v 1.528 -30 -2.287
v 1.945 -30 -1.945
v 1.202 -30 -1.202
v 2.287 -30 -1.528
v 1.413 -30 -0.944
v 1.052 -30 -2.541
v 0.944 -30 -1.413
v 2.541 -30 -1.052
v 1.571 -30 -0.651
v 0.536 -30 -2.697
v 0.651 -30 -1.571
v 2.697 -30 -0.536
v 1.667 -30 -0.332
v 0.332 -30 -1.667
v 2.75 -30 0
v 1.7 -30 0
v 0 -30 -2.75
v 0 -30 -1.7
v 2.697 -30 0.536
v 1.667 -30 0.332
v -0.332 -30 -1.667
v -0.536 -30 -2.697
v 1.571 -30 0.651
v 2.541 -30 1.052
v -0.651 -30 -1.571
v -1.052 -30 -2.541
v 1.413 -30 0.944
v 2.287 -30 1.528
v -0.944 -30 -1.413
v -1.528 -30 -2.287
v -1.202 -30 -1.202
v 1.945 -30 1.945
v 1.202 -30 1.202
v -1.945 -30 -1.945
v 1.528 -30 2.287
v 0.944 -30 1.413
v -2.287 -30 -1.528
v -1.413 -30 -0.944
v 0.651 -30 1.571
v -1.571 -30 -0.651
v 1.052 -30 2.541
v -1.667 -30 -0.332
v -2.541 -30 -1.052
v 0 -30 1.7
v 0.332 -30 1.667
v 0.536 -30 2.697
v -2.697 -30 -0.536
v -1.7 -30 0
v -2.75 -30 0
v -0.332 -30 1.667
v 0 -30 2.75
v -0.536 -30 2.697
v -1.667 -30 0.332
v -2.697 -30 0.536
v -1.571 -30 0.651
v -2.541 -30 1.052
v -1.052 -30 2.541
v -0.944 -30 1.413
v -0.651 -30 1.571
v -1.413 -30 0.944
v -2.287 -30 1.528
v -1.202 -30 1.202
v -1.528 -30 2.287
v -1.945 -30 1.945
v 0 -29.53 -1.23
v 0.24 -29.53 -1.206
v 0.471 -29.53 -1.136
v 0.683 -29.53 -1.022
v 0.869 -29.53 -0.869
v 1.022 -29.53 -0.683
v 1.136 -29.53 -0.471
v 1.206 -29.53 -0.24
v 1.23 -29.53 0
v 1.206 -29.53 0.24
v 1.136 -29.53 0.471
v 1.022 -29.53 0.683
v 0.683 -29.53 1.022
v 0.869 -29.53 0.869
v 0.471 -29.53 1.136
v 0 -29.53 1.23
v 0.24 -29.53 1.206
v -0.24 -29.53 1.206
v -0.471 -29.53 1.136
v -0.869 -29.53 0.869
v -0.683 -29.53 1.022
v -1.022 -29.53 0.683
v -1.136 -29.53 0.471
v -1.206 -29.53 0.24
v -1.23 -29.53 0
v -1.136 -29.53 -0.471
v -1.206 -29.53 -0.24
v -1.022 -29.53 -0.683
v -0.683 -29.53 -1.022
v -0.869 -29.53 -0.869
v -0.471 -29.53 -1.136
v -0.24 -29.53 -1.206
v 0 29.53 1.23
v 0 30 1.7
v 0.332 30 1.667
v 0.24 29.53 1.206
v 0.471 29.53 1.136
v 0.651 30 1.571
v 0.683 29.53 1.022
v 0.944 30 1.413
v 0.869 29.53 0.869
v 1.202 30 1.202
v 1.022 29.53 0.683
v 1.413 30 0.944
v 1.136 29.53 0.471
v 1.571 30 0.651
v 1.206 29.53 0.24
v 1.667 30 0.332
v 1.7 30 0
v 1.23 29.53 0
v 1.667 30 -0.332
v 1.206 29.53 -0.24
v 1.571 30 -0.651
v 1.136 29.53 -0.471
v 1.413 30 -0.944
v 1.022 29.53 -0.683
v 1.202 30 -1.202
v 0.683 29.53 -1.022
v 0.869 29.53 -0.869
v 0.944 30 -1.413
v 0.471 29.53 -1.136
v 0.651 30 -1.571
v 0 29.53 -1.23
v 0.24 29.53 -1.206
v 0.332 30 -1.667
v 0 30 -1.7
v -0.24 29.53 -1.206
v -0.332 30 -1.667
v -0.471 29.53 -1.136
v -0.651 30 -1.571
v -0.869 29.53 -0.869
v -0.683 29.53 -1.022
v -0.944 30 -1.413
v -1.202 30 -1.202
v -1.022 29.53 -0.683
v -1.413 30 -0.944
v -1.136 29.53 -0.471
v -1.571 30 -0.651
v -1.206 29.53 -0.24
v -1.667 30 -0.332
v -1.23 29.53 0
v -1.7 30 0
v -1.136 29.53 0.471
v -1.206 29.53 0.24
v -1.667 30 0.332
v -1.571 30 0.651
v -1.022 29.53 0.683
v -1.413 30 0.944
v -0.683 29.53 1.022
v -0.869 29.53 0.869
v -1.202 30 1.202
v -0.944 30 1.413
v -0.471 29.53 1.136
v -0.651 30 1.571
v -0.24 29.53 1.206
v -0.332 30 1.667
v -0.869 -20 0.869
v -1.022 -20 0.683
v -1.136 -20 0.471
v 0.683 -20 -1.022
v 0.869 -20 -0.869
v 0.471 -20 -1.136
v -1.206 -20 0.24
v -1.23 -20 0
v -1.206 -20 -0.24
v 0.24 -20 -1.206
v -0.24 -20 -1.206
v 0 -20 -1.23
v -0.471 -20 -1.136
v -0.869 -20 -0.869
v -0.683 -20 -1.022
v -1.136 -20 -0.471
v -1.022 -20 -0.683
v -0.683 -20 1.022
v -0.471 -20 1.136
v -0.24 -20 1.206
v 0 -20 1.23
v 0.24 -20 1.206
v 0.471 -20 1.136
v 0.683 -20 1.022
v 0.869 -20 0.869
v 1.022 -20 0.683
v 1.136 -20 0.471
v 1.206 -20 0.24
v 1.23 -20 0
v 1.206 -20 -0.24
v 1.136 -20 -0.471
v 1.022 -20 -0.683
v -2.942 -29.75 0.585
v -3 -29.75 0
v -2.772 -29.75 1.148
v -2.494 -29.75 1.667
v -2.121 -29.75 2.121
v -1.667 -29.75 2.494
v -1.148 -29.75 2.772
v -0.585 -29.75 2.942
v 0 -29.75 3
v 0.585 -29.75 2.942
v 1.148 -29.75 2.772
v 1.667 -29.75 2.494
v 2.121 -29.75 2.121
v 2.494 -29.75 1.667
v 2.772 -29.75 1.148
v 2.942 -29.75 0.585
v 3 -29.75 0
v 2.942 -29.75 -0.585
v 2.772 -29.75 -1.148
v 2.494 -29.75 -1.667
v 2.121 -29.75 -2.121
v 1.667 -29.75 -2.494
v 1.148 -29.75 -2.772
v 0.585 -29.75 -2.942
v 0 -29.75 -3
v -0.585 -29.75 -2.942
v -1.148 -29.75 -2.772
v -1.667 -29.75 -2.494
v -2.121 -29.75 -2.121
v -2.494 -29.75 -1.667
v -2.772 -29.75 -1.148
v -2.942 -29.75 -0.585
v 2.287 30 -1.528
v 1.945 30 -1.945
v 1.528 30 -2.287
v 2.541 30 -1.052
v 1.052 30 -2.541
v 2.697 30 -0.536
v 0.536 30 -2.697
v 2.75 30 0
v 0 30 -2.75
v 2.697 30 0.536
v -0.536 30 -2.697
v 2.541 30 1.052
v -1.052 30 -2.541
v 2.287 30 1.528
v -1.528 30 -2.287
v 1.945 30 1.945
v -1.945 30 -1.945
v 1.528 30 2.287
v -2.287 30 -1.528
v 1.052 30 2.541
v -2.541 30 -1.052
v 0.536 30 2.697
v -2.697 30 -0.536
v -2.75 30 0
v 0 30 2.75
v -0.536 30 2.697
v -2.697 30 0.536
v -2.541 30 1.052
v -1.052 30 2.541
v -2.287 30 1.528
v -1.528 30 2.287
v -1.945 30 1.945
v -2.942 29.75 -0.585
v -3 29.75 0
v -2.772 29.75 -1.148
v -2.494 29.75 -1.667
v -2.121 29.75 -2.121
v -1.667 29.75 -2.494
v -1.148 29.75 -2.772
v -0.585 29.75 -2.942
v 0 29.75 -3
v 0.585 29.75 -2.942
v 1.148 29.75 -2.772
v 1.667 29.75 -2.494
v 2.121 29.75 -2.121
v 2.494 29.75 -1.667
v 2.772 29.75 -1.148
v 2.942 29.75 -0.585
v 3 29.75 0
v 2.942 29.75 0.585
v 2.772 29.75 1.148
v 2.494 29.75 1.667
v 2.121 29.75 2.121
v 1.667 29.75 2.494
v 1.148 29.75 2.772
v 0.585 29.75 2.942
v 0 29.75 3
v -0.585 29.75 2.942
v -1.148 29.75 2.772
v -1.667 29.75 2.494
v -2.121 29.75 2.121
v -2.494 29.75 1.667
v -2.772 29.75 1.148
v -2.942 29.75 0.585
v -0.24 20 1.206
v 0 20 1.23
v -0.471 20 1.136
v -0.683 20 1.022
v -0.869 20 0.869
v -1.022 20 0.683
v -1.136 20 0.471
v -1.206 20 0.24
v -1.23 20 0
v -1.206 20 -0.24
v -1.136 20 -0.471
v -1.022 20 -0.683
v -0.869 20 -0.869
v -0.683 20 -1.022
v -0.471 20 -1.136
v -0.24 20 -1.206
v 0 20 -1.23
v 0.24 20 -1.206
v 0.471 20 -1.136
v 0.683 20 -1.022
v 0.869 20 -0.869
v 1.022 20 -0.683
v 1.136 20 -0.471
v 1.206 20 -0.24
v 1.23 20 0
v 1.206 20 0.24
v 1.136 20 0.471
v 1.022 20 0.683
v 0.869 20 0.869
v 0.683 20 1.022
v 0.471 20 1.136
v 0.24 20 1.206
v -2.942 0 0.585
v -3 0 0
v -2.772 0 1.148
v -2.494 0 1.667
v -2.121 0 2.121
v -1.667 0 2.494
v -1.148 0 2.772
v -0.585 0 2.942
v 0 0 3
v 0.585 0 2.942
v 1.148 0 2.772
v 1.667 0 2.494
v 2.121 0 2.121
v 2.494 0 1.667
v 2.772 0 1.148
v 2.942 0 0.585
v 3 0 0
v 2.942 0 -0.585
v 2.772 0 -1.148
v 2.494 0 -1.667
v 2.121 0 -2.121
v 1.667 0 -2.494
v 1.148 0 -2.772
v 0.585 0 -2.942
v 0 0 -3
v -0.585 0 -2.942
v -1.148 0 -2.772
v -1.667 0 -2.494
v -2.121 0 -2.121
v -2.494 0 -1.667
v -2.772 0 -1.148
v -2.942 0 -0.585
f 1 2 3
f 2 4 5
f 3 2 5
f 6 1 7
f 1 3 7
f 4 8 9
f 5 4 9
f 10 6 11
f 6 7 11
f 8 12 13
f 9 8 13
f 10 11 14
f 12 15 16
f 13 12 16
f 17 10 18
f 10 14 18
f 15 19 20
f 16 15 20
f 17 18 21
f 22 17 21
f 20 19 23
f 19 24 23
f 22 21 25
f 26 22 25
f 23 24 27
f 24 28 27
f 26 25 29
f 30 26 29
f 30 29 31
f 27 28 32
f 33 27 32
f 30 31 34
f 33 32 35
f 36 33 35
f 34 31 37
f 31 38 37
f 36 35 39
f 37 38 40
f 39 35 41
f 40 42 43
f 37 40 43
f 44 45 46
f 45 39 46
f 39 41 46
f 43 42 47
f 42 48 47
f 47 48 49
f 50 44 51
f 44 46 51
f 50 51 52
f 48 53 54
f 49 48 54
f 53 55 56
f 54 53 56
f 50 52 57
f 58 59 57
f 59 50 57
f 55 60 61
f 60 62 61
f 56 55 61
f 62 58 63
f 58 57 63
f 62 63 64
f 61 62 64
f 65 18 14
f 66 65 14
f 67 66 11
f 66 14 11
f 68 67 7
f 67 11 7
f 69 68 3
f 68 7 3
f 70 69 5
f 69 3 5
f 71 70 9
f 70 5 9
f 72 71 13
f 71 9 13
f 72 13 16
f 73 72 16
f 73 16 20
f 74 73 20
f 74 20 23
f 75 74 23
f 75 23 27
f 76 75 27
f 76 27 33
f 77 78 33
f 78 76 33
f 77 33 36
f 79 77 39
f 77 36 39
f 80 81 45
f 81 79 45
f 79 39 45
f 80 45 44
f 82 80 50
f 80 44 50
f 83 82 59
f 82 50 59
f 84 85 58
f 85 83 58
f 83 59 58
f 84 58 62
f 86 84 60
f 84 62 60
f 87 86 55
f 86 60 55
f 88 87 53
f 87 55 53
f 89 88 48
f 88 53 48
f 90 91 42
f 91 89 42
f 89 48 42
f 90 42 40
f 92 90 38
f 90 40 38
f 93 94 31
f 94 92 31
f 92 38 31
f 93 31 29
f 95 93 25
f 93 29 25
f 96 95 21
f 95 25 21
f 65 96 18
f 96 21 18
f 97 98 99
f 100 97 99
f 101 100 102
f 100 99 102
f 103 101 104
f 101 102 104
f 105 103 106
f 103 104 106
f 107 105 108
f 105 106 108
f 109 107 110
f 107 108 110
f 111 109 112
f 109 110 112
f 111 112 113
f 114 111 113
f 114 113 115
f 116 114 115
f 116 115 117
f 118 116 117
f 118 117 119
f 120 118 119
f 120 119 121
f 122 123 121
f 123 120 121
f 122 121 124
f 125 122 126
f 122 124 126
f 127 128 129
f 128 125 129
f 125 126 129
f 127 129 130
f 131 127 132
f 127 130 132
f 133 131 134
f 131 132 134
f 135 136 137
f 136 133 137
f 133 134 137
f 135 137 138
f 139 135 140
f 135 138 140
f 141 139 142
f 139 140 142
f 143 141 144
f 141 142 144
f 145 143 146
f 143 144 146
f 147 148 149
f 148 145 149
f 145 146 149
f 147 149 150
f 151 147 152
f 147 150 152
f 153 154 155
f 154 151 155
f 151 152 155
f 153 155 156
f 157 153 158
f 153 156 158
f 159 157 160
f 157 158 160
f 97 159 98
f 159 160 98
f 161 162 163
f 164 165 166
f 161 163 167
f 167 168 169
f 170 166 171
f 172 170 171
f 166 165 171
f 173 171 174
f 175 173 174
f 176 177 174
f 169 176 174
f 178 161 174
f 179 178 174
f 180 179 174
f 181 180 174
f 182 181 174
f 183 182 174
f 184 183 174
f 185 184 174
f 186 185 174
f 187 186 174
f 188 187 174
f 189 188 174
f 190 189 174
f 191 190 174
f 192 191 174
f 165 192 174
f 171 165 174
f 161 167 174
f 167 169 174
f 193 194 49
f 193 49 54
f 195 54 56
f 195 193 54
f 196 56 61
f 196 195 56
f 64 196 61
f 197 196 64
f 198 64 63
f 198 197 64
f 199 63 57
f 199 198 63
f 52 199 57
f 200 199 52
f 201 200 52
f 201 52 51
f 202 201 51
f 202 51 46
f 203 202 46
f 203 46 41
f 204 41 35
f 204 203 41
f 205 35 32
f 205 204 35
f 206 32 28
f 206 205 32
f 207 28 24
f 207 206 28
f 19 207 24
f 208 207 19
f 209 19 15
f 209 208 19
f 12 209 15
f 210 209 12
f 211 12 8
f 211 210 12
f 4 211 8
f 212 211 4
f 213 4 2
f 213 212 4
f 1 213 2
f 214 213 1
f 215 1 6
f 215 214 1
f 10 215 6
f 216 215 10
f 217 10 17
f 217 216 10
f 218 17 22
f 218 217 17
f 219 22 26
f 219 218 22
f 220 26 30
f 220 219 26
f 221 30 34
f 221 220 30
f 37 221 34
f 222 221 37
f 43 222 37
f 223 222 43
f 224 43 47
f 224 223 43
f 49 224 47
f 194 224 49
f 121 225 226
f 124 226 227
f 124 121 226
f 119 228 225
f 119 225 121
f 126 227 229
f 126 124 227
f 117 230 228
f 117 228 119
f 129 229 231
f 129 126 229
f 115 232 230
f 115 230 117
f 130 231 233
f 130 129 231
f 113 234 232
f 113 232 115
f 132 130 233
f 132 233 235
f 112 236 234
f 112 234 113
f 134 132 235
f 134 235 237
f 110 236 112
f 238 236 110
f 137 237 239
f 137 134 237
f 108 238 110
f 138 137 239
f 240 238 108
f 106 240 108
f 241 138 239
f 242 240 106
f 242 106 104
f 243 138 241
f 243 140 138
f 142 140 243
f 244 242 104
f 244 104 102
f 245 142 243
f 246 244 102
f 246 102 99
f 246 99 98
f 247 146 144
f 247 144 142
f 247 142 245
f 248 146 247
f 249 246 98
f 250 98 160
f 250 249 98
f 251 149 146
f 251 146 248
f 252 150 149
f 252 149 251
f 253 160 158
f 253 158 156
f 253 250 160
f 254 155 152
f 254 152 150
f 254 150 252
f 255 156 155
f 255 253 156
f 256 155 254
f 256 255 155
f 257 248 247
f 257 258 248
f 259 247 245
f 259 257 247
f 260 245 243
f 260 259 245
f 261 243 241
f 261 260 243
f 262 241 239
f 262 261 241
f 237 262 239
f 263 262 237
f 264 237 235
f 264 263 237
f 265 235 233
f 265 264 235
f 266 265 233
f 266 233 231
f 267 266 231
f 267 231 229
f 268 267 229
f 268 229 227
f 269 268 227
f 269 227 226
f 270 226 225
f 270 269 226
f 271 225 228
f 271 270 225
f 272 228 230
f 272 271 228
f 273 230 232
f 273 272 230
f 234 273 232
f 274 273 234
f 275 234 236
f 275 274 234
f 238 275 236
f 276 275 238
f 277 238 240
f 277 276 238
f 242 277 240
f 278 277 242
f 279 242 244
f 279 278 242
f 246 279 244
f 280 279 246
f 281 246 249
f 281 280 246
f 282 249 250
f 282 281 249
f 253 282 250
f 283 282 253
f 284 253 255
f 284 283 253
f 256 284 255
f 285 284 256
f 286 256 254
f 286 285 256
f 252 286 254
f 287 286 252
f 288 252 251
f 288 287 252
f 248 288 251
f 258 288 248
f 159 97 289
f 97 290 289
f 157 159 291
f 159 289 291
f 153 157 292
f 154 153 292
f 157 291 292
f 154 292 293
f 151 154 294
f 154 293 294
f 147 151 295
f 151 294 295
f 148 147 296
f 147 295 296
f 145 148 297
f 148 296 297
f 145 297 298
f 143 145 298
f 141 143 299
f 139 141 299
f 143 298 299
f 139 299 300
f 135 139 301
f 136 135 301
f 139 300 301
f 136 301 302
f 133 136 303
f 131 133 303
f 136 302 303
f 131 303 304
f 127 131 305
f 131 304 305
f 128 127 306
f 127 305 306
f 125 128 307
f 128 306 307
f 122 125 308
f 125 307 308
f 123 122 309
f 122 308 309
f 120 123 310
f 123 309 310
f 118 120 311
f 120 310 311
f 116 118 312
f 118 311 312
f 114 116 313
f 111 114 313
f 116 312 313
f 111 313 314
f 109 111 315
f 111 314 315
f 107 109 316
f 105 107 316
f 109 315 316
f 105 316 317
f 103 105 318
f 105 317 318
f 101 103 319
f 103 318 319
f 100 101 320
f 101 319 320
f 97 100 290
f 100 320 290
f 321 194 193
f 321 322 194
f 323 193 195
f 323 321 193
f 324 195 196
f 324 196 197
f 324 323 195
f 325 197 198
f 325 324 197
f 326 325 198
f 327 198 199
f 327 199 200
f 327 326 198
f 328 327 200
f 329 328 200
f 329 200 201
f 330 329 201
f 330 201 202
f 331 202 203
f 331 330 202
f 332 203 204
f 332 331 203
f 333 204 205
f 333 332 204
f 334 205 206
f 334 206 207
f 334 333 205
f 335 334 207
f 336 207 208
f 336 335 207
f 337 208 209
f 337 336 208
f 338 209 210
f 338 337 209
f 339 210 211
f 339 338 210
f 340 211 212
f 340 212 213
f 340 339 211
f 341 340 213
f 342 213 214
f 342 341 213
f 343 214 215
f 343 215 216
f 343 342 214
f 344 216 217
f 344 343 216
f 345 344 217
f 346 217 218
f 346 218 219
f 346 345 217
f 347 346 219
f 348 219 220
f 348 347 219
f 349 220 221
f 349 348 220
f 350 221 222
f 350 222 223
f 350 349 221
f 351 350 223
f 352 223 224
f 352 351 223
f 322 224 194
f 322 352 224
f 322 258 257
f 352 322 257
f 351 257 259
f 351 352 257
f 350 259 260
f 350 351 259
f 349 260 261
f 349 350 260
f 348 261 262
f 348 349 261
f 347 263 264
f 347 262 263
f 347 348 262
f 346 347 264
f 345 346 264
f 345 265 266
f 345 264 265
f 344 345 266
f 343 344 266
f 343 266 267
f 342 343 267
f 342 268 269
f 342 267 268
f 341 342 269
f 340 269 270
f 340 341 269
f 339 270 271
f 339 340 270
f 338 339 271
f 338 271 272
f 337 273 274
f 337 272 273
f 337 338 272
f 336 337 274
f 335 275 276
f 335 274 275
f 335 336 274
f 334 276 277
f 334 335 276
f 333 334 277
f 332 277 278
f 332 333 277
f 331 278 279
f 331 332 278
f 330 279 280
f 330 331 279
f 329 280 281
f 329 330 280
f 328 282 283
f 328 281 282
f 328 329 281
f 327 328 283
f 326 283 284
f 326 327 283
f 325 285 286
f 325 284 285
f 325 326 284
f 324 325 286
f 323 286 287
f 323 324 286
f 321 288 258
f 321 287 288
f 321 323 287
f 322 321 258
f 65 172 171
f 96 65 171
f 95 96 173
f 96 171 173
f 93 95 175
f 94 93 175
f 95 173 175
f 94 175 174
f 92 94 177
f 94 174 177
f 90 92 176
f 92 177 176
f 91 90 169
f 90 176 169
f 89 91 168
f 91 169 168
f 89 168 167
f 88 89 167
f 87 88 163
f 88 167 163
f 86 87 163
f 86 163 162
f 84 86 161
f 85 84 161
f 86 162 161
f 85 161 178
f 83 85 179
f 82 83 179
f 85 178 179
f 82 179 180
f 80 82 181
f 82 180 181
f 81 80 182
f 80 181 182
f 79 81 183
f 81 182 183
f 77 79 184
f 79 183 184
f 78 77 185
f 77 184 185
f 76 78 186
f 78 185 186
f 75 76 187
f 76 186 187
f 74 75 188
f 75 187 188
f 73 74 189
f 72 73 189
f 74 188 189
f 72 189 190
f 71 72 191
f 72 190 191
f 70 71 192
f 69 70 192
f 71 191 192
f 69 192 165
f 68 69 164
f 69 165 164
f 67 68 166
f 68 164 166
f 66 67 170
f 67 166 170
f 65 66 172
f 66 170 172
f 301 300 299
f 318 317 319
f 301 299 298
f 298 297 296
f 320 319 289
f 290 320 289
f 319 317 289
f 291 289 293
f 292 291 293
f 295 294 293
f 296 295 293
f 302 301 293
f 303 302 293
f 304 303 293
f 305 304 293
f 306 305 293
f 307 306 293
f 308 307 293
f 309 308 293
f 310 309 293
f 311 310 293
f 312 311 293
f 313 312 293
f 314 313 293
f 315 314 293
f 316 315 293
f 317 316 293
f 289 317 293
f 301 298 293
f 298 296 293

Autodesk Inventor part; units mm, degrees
ref_plane "YZ Plane" through (0, 0, 0) normal (1, 0, 0) x (0, 1, 0)
ref_plane "XZ Plane" through (0, 0, 0) normal (0, 1, 0) x (-1, 0, 0)
ref_plane "XY Plane" through (0, 0, 0) normal (0, 0, 1) x (1, 0, 0)
sketch "スケッチ1" plane through (0, 0, 0) normal (0, 1, 0) x (-1, 0, 0)
  circle A0 centre (0, 0) radius 3
  dimension "d0" = 6
extrude "押し出し1" add sketch "スケッチ1" along normal mid plane 60
sketch "スケッチ2" plane through (0, 30, 0) normal (0, 1, 0) x (1, 0, 0)
  point P0 (0, 0)
  point P1 (0, 0)
hole "穴1" at (0, 30, 0) direction (0, -1, 0) diameter 2.459 depth 10 countersink diameter 3.4 countersink angle 90 thread size "M3x0.5" class "6H" standard "ISO Metric profile"
sketch "スケッチ3" plane through (0, -30, 0) normal (0, -1, 0) x (1, 0, 0)
  point P0 (0, 0)
  point P1 (0, 0)
hole "穴2" at (0, -30, 0) direction (0, 1, 0) diameter 2.459 depth 10 countersink diameter 3.4 countersink angle 90 thread size "M3x0.5" class "6H" standard "ISO Metric profile"
chamfer "面取り1" distance 0.25 angle 45 2 edges at (3, -30, 0) (3, 30, 0)
properties part number "Spacer_M3D6L60" material "アルミニウム 6061"
